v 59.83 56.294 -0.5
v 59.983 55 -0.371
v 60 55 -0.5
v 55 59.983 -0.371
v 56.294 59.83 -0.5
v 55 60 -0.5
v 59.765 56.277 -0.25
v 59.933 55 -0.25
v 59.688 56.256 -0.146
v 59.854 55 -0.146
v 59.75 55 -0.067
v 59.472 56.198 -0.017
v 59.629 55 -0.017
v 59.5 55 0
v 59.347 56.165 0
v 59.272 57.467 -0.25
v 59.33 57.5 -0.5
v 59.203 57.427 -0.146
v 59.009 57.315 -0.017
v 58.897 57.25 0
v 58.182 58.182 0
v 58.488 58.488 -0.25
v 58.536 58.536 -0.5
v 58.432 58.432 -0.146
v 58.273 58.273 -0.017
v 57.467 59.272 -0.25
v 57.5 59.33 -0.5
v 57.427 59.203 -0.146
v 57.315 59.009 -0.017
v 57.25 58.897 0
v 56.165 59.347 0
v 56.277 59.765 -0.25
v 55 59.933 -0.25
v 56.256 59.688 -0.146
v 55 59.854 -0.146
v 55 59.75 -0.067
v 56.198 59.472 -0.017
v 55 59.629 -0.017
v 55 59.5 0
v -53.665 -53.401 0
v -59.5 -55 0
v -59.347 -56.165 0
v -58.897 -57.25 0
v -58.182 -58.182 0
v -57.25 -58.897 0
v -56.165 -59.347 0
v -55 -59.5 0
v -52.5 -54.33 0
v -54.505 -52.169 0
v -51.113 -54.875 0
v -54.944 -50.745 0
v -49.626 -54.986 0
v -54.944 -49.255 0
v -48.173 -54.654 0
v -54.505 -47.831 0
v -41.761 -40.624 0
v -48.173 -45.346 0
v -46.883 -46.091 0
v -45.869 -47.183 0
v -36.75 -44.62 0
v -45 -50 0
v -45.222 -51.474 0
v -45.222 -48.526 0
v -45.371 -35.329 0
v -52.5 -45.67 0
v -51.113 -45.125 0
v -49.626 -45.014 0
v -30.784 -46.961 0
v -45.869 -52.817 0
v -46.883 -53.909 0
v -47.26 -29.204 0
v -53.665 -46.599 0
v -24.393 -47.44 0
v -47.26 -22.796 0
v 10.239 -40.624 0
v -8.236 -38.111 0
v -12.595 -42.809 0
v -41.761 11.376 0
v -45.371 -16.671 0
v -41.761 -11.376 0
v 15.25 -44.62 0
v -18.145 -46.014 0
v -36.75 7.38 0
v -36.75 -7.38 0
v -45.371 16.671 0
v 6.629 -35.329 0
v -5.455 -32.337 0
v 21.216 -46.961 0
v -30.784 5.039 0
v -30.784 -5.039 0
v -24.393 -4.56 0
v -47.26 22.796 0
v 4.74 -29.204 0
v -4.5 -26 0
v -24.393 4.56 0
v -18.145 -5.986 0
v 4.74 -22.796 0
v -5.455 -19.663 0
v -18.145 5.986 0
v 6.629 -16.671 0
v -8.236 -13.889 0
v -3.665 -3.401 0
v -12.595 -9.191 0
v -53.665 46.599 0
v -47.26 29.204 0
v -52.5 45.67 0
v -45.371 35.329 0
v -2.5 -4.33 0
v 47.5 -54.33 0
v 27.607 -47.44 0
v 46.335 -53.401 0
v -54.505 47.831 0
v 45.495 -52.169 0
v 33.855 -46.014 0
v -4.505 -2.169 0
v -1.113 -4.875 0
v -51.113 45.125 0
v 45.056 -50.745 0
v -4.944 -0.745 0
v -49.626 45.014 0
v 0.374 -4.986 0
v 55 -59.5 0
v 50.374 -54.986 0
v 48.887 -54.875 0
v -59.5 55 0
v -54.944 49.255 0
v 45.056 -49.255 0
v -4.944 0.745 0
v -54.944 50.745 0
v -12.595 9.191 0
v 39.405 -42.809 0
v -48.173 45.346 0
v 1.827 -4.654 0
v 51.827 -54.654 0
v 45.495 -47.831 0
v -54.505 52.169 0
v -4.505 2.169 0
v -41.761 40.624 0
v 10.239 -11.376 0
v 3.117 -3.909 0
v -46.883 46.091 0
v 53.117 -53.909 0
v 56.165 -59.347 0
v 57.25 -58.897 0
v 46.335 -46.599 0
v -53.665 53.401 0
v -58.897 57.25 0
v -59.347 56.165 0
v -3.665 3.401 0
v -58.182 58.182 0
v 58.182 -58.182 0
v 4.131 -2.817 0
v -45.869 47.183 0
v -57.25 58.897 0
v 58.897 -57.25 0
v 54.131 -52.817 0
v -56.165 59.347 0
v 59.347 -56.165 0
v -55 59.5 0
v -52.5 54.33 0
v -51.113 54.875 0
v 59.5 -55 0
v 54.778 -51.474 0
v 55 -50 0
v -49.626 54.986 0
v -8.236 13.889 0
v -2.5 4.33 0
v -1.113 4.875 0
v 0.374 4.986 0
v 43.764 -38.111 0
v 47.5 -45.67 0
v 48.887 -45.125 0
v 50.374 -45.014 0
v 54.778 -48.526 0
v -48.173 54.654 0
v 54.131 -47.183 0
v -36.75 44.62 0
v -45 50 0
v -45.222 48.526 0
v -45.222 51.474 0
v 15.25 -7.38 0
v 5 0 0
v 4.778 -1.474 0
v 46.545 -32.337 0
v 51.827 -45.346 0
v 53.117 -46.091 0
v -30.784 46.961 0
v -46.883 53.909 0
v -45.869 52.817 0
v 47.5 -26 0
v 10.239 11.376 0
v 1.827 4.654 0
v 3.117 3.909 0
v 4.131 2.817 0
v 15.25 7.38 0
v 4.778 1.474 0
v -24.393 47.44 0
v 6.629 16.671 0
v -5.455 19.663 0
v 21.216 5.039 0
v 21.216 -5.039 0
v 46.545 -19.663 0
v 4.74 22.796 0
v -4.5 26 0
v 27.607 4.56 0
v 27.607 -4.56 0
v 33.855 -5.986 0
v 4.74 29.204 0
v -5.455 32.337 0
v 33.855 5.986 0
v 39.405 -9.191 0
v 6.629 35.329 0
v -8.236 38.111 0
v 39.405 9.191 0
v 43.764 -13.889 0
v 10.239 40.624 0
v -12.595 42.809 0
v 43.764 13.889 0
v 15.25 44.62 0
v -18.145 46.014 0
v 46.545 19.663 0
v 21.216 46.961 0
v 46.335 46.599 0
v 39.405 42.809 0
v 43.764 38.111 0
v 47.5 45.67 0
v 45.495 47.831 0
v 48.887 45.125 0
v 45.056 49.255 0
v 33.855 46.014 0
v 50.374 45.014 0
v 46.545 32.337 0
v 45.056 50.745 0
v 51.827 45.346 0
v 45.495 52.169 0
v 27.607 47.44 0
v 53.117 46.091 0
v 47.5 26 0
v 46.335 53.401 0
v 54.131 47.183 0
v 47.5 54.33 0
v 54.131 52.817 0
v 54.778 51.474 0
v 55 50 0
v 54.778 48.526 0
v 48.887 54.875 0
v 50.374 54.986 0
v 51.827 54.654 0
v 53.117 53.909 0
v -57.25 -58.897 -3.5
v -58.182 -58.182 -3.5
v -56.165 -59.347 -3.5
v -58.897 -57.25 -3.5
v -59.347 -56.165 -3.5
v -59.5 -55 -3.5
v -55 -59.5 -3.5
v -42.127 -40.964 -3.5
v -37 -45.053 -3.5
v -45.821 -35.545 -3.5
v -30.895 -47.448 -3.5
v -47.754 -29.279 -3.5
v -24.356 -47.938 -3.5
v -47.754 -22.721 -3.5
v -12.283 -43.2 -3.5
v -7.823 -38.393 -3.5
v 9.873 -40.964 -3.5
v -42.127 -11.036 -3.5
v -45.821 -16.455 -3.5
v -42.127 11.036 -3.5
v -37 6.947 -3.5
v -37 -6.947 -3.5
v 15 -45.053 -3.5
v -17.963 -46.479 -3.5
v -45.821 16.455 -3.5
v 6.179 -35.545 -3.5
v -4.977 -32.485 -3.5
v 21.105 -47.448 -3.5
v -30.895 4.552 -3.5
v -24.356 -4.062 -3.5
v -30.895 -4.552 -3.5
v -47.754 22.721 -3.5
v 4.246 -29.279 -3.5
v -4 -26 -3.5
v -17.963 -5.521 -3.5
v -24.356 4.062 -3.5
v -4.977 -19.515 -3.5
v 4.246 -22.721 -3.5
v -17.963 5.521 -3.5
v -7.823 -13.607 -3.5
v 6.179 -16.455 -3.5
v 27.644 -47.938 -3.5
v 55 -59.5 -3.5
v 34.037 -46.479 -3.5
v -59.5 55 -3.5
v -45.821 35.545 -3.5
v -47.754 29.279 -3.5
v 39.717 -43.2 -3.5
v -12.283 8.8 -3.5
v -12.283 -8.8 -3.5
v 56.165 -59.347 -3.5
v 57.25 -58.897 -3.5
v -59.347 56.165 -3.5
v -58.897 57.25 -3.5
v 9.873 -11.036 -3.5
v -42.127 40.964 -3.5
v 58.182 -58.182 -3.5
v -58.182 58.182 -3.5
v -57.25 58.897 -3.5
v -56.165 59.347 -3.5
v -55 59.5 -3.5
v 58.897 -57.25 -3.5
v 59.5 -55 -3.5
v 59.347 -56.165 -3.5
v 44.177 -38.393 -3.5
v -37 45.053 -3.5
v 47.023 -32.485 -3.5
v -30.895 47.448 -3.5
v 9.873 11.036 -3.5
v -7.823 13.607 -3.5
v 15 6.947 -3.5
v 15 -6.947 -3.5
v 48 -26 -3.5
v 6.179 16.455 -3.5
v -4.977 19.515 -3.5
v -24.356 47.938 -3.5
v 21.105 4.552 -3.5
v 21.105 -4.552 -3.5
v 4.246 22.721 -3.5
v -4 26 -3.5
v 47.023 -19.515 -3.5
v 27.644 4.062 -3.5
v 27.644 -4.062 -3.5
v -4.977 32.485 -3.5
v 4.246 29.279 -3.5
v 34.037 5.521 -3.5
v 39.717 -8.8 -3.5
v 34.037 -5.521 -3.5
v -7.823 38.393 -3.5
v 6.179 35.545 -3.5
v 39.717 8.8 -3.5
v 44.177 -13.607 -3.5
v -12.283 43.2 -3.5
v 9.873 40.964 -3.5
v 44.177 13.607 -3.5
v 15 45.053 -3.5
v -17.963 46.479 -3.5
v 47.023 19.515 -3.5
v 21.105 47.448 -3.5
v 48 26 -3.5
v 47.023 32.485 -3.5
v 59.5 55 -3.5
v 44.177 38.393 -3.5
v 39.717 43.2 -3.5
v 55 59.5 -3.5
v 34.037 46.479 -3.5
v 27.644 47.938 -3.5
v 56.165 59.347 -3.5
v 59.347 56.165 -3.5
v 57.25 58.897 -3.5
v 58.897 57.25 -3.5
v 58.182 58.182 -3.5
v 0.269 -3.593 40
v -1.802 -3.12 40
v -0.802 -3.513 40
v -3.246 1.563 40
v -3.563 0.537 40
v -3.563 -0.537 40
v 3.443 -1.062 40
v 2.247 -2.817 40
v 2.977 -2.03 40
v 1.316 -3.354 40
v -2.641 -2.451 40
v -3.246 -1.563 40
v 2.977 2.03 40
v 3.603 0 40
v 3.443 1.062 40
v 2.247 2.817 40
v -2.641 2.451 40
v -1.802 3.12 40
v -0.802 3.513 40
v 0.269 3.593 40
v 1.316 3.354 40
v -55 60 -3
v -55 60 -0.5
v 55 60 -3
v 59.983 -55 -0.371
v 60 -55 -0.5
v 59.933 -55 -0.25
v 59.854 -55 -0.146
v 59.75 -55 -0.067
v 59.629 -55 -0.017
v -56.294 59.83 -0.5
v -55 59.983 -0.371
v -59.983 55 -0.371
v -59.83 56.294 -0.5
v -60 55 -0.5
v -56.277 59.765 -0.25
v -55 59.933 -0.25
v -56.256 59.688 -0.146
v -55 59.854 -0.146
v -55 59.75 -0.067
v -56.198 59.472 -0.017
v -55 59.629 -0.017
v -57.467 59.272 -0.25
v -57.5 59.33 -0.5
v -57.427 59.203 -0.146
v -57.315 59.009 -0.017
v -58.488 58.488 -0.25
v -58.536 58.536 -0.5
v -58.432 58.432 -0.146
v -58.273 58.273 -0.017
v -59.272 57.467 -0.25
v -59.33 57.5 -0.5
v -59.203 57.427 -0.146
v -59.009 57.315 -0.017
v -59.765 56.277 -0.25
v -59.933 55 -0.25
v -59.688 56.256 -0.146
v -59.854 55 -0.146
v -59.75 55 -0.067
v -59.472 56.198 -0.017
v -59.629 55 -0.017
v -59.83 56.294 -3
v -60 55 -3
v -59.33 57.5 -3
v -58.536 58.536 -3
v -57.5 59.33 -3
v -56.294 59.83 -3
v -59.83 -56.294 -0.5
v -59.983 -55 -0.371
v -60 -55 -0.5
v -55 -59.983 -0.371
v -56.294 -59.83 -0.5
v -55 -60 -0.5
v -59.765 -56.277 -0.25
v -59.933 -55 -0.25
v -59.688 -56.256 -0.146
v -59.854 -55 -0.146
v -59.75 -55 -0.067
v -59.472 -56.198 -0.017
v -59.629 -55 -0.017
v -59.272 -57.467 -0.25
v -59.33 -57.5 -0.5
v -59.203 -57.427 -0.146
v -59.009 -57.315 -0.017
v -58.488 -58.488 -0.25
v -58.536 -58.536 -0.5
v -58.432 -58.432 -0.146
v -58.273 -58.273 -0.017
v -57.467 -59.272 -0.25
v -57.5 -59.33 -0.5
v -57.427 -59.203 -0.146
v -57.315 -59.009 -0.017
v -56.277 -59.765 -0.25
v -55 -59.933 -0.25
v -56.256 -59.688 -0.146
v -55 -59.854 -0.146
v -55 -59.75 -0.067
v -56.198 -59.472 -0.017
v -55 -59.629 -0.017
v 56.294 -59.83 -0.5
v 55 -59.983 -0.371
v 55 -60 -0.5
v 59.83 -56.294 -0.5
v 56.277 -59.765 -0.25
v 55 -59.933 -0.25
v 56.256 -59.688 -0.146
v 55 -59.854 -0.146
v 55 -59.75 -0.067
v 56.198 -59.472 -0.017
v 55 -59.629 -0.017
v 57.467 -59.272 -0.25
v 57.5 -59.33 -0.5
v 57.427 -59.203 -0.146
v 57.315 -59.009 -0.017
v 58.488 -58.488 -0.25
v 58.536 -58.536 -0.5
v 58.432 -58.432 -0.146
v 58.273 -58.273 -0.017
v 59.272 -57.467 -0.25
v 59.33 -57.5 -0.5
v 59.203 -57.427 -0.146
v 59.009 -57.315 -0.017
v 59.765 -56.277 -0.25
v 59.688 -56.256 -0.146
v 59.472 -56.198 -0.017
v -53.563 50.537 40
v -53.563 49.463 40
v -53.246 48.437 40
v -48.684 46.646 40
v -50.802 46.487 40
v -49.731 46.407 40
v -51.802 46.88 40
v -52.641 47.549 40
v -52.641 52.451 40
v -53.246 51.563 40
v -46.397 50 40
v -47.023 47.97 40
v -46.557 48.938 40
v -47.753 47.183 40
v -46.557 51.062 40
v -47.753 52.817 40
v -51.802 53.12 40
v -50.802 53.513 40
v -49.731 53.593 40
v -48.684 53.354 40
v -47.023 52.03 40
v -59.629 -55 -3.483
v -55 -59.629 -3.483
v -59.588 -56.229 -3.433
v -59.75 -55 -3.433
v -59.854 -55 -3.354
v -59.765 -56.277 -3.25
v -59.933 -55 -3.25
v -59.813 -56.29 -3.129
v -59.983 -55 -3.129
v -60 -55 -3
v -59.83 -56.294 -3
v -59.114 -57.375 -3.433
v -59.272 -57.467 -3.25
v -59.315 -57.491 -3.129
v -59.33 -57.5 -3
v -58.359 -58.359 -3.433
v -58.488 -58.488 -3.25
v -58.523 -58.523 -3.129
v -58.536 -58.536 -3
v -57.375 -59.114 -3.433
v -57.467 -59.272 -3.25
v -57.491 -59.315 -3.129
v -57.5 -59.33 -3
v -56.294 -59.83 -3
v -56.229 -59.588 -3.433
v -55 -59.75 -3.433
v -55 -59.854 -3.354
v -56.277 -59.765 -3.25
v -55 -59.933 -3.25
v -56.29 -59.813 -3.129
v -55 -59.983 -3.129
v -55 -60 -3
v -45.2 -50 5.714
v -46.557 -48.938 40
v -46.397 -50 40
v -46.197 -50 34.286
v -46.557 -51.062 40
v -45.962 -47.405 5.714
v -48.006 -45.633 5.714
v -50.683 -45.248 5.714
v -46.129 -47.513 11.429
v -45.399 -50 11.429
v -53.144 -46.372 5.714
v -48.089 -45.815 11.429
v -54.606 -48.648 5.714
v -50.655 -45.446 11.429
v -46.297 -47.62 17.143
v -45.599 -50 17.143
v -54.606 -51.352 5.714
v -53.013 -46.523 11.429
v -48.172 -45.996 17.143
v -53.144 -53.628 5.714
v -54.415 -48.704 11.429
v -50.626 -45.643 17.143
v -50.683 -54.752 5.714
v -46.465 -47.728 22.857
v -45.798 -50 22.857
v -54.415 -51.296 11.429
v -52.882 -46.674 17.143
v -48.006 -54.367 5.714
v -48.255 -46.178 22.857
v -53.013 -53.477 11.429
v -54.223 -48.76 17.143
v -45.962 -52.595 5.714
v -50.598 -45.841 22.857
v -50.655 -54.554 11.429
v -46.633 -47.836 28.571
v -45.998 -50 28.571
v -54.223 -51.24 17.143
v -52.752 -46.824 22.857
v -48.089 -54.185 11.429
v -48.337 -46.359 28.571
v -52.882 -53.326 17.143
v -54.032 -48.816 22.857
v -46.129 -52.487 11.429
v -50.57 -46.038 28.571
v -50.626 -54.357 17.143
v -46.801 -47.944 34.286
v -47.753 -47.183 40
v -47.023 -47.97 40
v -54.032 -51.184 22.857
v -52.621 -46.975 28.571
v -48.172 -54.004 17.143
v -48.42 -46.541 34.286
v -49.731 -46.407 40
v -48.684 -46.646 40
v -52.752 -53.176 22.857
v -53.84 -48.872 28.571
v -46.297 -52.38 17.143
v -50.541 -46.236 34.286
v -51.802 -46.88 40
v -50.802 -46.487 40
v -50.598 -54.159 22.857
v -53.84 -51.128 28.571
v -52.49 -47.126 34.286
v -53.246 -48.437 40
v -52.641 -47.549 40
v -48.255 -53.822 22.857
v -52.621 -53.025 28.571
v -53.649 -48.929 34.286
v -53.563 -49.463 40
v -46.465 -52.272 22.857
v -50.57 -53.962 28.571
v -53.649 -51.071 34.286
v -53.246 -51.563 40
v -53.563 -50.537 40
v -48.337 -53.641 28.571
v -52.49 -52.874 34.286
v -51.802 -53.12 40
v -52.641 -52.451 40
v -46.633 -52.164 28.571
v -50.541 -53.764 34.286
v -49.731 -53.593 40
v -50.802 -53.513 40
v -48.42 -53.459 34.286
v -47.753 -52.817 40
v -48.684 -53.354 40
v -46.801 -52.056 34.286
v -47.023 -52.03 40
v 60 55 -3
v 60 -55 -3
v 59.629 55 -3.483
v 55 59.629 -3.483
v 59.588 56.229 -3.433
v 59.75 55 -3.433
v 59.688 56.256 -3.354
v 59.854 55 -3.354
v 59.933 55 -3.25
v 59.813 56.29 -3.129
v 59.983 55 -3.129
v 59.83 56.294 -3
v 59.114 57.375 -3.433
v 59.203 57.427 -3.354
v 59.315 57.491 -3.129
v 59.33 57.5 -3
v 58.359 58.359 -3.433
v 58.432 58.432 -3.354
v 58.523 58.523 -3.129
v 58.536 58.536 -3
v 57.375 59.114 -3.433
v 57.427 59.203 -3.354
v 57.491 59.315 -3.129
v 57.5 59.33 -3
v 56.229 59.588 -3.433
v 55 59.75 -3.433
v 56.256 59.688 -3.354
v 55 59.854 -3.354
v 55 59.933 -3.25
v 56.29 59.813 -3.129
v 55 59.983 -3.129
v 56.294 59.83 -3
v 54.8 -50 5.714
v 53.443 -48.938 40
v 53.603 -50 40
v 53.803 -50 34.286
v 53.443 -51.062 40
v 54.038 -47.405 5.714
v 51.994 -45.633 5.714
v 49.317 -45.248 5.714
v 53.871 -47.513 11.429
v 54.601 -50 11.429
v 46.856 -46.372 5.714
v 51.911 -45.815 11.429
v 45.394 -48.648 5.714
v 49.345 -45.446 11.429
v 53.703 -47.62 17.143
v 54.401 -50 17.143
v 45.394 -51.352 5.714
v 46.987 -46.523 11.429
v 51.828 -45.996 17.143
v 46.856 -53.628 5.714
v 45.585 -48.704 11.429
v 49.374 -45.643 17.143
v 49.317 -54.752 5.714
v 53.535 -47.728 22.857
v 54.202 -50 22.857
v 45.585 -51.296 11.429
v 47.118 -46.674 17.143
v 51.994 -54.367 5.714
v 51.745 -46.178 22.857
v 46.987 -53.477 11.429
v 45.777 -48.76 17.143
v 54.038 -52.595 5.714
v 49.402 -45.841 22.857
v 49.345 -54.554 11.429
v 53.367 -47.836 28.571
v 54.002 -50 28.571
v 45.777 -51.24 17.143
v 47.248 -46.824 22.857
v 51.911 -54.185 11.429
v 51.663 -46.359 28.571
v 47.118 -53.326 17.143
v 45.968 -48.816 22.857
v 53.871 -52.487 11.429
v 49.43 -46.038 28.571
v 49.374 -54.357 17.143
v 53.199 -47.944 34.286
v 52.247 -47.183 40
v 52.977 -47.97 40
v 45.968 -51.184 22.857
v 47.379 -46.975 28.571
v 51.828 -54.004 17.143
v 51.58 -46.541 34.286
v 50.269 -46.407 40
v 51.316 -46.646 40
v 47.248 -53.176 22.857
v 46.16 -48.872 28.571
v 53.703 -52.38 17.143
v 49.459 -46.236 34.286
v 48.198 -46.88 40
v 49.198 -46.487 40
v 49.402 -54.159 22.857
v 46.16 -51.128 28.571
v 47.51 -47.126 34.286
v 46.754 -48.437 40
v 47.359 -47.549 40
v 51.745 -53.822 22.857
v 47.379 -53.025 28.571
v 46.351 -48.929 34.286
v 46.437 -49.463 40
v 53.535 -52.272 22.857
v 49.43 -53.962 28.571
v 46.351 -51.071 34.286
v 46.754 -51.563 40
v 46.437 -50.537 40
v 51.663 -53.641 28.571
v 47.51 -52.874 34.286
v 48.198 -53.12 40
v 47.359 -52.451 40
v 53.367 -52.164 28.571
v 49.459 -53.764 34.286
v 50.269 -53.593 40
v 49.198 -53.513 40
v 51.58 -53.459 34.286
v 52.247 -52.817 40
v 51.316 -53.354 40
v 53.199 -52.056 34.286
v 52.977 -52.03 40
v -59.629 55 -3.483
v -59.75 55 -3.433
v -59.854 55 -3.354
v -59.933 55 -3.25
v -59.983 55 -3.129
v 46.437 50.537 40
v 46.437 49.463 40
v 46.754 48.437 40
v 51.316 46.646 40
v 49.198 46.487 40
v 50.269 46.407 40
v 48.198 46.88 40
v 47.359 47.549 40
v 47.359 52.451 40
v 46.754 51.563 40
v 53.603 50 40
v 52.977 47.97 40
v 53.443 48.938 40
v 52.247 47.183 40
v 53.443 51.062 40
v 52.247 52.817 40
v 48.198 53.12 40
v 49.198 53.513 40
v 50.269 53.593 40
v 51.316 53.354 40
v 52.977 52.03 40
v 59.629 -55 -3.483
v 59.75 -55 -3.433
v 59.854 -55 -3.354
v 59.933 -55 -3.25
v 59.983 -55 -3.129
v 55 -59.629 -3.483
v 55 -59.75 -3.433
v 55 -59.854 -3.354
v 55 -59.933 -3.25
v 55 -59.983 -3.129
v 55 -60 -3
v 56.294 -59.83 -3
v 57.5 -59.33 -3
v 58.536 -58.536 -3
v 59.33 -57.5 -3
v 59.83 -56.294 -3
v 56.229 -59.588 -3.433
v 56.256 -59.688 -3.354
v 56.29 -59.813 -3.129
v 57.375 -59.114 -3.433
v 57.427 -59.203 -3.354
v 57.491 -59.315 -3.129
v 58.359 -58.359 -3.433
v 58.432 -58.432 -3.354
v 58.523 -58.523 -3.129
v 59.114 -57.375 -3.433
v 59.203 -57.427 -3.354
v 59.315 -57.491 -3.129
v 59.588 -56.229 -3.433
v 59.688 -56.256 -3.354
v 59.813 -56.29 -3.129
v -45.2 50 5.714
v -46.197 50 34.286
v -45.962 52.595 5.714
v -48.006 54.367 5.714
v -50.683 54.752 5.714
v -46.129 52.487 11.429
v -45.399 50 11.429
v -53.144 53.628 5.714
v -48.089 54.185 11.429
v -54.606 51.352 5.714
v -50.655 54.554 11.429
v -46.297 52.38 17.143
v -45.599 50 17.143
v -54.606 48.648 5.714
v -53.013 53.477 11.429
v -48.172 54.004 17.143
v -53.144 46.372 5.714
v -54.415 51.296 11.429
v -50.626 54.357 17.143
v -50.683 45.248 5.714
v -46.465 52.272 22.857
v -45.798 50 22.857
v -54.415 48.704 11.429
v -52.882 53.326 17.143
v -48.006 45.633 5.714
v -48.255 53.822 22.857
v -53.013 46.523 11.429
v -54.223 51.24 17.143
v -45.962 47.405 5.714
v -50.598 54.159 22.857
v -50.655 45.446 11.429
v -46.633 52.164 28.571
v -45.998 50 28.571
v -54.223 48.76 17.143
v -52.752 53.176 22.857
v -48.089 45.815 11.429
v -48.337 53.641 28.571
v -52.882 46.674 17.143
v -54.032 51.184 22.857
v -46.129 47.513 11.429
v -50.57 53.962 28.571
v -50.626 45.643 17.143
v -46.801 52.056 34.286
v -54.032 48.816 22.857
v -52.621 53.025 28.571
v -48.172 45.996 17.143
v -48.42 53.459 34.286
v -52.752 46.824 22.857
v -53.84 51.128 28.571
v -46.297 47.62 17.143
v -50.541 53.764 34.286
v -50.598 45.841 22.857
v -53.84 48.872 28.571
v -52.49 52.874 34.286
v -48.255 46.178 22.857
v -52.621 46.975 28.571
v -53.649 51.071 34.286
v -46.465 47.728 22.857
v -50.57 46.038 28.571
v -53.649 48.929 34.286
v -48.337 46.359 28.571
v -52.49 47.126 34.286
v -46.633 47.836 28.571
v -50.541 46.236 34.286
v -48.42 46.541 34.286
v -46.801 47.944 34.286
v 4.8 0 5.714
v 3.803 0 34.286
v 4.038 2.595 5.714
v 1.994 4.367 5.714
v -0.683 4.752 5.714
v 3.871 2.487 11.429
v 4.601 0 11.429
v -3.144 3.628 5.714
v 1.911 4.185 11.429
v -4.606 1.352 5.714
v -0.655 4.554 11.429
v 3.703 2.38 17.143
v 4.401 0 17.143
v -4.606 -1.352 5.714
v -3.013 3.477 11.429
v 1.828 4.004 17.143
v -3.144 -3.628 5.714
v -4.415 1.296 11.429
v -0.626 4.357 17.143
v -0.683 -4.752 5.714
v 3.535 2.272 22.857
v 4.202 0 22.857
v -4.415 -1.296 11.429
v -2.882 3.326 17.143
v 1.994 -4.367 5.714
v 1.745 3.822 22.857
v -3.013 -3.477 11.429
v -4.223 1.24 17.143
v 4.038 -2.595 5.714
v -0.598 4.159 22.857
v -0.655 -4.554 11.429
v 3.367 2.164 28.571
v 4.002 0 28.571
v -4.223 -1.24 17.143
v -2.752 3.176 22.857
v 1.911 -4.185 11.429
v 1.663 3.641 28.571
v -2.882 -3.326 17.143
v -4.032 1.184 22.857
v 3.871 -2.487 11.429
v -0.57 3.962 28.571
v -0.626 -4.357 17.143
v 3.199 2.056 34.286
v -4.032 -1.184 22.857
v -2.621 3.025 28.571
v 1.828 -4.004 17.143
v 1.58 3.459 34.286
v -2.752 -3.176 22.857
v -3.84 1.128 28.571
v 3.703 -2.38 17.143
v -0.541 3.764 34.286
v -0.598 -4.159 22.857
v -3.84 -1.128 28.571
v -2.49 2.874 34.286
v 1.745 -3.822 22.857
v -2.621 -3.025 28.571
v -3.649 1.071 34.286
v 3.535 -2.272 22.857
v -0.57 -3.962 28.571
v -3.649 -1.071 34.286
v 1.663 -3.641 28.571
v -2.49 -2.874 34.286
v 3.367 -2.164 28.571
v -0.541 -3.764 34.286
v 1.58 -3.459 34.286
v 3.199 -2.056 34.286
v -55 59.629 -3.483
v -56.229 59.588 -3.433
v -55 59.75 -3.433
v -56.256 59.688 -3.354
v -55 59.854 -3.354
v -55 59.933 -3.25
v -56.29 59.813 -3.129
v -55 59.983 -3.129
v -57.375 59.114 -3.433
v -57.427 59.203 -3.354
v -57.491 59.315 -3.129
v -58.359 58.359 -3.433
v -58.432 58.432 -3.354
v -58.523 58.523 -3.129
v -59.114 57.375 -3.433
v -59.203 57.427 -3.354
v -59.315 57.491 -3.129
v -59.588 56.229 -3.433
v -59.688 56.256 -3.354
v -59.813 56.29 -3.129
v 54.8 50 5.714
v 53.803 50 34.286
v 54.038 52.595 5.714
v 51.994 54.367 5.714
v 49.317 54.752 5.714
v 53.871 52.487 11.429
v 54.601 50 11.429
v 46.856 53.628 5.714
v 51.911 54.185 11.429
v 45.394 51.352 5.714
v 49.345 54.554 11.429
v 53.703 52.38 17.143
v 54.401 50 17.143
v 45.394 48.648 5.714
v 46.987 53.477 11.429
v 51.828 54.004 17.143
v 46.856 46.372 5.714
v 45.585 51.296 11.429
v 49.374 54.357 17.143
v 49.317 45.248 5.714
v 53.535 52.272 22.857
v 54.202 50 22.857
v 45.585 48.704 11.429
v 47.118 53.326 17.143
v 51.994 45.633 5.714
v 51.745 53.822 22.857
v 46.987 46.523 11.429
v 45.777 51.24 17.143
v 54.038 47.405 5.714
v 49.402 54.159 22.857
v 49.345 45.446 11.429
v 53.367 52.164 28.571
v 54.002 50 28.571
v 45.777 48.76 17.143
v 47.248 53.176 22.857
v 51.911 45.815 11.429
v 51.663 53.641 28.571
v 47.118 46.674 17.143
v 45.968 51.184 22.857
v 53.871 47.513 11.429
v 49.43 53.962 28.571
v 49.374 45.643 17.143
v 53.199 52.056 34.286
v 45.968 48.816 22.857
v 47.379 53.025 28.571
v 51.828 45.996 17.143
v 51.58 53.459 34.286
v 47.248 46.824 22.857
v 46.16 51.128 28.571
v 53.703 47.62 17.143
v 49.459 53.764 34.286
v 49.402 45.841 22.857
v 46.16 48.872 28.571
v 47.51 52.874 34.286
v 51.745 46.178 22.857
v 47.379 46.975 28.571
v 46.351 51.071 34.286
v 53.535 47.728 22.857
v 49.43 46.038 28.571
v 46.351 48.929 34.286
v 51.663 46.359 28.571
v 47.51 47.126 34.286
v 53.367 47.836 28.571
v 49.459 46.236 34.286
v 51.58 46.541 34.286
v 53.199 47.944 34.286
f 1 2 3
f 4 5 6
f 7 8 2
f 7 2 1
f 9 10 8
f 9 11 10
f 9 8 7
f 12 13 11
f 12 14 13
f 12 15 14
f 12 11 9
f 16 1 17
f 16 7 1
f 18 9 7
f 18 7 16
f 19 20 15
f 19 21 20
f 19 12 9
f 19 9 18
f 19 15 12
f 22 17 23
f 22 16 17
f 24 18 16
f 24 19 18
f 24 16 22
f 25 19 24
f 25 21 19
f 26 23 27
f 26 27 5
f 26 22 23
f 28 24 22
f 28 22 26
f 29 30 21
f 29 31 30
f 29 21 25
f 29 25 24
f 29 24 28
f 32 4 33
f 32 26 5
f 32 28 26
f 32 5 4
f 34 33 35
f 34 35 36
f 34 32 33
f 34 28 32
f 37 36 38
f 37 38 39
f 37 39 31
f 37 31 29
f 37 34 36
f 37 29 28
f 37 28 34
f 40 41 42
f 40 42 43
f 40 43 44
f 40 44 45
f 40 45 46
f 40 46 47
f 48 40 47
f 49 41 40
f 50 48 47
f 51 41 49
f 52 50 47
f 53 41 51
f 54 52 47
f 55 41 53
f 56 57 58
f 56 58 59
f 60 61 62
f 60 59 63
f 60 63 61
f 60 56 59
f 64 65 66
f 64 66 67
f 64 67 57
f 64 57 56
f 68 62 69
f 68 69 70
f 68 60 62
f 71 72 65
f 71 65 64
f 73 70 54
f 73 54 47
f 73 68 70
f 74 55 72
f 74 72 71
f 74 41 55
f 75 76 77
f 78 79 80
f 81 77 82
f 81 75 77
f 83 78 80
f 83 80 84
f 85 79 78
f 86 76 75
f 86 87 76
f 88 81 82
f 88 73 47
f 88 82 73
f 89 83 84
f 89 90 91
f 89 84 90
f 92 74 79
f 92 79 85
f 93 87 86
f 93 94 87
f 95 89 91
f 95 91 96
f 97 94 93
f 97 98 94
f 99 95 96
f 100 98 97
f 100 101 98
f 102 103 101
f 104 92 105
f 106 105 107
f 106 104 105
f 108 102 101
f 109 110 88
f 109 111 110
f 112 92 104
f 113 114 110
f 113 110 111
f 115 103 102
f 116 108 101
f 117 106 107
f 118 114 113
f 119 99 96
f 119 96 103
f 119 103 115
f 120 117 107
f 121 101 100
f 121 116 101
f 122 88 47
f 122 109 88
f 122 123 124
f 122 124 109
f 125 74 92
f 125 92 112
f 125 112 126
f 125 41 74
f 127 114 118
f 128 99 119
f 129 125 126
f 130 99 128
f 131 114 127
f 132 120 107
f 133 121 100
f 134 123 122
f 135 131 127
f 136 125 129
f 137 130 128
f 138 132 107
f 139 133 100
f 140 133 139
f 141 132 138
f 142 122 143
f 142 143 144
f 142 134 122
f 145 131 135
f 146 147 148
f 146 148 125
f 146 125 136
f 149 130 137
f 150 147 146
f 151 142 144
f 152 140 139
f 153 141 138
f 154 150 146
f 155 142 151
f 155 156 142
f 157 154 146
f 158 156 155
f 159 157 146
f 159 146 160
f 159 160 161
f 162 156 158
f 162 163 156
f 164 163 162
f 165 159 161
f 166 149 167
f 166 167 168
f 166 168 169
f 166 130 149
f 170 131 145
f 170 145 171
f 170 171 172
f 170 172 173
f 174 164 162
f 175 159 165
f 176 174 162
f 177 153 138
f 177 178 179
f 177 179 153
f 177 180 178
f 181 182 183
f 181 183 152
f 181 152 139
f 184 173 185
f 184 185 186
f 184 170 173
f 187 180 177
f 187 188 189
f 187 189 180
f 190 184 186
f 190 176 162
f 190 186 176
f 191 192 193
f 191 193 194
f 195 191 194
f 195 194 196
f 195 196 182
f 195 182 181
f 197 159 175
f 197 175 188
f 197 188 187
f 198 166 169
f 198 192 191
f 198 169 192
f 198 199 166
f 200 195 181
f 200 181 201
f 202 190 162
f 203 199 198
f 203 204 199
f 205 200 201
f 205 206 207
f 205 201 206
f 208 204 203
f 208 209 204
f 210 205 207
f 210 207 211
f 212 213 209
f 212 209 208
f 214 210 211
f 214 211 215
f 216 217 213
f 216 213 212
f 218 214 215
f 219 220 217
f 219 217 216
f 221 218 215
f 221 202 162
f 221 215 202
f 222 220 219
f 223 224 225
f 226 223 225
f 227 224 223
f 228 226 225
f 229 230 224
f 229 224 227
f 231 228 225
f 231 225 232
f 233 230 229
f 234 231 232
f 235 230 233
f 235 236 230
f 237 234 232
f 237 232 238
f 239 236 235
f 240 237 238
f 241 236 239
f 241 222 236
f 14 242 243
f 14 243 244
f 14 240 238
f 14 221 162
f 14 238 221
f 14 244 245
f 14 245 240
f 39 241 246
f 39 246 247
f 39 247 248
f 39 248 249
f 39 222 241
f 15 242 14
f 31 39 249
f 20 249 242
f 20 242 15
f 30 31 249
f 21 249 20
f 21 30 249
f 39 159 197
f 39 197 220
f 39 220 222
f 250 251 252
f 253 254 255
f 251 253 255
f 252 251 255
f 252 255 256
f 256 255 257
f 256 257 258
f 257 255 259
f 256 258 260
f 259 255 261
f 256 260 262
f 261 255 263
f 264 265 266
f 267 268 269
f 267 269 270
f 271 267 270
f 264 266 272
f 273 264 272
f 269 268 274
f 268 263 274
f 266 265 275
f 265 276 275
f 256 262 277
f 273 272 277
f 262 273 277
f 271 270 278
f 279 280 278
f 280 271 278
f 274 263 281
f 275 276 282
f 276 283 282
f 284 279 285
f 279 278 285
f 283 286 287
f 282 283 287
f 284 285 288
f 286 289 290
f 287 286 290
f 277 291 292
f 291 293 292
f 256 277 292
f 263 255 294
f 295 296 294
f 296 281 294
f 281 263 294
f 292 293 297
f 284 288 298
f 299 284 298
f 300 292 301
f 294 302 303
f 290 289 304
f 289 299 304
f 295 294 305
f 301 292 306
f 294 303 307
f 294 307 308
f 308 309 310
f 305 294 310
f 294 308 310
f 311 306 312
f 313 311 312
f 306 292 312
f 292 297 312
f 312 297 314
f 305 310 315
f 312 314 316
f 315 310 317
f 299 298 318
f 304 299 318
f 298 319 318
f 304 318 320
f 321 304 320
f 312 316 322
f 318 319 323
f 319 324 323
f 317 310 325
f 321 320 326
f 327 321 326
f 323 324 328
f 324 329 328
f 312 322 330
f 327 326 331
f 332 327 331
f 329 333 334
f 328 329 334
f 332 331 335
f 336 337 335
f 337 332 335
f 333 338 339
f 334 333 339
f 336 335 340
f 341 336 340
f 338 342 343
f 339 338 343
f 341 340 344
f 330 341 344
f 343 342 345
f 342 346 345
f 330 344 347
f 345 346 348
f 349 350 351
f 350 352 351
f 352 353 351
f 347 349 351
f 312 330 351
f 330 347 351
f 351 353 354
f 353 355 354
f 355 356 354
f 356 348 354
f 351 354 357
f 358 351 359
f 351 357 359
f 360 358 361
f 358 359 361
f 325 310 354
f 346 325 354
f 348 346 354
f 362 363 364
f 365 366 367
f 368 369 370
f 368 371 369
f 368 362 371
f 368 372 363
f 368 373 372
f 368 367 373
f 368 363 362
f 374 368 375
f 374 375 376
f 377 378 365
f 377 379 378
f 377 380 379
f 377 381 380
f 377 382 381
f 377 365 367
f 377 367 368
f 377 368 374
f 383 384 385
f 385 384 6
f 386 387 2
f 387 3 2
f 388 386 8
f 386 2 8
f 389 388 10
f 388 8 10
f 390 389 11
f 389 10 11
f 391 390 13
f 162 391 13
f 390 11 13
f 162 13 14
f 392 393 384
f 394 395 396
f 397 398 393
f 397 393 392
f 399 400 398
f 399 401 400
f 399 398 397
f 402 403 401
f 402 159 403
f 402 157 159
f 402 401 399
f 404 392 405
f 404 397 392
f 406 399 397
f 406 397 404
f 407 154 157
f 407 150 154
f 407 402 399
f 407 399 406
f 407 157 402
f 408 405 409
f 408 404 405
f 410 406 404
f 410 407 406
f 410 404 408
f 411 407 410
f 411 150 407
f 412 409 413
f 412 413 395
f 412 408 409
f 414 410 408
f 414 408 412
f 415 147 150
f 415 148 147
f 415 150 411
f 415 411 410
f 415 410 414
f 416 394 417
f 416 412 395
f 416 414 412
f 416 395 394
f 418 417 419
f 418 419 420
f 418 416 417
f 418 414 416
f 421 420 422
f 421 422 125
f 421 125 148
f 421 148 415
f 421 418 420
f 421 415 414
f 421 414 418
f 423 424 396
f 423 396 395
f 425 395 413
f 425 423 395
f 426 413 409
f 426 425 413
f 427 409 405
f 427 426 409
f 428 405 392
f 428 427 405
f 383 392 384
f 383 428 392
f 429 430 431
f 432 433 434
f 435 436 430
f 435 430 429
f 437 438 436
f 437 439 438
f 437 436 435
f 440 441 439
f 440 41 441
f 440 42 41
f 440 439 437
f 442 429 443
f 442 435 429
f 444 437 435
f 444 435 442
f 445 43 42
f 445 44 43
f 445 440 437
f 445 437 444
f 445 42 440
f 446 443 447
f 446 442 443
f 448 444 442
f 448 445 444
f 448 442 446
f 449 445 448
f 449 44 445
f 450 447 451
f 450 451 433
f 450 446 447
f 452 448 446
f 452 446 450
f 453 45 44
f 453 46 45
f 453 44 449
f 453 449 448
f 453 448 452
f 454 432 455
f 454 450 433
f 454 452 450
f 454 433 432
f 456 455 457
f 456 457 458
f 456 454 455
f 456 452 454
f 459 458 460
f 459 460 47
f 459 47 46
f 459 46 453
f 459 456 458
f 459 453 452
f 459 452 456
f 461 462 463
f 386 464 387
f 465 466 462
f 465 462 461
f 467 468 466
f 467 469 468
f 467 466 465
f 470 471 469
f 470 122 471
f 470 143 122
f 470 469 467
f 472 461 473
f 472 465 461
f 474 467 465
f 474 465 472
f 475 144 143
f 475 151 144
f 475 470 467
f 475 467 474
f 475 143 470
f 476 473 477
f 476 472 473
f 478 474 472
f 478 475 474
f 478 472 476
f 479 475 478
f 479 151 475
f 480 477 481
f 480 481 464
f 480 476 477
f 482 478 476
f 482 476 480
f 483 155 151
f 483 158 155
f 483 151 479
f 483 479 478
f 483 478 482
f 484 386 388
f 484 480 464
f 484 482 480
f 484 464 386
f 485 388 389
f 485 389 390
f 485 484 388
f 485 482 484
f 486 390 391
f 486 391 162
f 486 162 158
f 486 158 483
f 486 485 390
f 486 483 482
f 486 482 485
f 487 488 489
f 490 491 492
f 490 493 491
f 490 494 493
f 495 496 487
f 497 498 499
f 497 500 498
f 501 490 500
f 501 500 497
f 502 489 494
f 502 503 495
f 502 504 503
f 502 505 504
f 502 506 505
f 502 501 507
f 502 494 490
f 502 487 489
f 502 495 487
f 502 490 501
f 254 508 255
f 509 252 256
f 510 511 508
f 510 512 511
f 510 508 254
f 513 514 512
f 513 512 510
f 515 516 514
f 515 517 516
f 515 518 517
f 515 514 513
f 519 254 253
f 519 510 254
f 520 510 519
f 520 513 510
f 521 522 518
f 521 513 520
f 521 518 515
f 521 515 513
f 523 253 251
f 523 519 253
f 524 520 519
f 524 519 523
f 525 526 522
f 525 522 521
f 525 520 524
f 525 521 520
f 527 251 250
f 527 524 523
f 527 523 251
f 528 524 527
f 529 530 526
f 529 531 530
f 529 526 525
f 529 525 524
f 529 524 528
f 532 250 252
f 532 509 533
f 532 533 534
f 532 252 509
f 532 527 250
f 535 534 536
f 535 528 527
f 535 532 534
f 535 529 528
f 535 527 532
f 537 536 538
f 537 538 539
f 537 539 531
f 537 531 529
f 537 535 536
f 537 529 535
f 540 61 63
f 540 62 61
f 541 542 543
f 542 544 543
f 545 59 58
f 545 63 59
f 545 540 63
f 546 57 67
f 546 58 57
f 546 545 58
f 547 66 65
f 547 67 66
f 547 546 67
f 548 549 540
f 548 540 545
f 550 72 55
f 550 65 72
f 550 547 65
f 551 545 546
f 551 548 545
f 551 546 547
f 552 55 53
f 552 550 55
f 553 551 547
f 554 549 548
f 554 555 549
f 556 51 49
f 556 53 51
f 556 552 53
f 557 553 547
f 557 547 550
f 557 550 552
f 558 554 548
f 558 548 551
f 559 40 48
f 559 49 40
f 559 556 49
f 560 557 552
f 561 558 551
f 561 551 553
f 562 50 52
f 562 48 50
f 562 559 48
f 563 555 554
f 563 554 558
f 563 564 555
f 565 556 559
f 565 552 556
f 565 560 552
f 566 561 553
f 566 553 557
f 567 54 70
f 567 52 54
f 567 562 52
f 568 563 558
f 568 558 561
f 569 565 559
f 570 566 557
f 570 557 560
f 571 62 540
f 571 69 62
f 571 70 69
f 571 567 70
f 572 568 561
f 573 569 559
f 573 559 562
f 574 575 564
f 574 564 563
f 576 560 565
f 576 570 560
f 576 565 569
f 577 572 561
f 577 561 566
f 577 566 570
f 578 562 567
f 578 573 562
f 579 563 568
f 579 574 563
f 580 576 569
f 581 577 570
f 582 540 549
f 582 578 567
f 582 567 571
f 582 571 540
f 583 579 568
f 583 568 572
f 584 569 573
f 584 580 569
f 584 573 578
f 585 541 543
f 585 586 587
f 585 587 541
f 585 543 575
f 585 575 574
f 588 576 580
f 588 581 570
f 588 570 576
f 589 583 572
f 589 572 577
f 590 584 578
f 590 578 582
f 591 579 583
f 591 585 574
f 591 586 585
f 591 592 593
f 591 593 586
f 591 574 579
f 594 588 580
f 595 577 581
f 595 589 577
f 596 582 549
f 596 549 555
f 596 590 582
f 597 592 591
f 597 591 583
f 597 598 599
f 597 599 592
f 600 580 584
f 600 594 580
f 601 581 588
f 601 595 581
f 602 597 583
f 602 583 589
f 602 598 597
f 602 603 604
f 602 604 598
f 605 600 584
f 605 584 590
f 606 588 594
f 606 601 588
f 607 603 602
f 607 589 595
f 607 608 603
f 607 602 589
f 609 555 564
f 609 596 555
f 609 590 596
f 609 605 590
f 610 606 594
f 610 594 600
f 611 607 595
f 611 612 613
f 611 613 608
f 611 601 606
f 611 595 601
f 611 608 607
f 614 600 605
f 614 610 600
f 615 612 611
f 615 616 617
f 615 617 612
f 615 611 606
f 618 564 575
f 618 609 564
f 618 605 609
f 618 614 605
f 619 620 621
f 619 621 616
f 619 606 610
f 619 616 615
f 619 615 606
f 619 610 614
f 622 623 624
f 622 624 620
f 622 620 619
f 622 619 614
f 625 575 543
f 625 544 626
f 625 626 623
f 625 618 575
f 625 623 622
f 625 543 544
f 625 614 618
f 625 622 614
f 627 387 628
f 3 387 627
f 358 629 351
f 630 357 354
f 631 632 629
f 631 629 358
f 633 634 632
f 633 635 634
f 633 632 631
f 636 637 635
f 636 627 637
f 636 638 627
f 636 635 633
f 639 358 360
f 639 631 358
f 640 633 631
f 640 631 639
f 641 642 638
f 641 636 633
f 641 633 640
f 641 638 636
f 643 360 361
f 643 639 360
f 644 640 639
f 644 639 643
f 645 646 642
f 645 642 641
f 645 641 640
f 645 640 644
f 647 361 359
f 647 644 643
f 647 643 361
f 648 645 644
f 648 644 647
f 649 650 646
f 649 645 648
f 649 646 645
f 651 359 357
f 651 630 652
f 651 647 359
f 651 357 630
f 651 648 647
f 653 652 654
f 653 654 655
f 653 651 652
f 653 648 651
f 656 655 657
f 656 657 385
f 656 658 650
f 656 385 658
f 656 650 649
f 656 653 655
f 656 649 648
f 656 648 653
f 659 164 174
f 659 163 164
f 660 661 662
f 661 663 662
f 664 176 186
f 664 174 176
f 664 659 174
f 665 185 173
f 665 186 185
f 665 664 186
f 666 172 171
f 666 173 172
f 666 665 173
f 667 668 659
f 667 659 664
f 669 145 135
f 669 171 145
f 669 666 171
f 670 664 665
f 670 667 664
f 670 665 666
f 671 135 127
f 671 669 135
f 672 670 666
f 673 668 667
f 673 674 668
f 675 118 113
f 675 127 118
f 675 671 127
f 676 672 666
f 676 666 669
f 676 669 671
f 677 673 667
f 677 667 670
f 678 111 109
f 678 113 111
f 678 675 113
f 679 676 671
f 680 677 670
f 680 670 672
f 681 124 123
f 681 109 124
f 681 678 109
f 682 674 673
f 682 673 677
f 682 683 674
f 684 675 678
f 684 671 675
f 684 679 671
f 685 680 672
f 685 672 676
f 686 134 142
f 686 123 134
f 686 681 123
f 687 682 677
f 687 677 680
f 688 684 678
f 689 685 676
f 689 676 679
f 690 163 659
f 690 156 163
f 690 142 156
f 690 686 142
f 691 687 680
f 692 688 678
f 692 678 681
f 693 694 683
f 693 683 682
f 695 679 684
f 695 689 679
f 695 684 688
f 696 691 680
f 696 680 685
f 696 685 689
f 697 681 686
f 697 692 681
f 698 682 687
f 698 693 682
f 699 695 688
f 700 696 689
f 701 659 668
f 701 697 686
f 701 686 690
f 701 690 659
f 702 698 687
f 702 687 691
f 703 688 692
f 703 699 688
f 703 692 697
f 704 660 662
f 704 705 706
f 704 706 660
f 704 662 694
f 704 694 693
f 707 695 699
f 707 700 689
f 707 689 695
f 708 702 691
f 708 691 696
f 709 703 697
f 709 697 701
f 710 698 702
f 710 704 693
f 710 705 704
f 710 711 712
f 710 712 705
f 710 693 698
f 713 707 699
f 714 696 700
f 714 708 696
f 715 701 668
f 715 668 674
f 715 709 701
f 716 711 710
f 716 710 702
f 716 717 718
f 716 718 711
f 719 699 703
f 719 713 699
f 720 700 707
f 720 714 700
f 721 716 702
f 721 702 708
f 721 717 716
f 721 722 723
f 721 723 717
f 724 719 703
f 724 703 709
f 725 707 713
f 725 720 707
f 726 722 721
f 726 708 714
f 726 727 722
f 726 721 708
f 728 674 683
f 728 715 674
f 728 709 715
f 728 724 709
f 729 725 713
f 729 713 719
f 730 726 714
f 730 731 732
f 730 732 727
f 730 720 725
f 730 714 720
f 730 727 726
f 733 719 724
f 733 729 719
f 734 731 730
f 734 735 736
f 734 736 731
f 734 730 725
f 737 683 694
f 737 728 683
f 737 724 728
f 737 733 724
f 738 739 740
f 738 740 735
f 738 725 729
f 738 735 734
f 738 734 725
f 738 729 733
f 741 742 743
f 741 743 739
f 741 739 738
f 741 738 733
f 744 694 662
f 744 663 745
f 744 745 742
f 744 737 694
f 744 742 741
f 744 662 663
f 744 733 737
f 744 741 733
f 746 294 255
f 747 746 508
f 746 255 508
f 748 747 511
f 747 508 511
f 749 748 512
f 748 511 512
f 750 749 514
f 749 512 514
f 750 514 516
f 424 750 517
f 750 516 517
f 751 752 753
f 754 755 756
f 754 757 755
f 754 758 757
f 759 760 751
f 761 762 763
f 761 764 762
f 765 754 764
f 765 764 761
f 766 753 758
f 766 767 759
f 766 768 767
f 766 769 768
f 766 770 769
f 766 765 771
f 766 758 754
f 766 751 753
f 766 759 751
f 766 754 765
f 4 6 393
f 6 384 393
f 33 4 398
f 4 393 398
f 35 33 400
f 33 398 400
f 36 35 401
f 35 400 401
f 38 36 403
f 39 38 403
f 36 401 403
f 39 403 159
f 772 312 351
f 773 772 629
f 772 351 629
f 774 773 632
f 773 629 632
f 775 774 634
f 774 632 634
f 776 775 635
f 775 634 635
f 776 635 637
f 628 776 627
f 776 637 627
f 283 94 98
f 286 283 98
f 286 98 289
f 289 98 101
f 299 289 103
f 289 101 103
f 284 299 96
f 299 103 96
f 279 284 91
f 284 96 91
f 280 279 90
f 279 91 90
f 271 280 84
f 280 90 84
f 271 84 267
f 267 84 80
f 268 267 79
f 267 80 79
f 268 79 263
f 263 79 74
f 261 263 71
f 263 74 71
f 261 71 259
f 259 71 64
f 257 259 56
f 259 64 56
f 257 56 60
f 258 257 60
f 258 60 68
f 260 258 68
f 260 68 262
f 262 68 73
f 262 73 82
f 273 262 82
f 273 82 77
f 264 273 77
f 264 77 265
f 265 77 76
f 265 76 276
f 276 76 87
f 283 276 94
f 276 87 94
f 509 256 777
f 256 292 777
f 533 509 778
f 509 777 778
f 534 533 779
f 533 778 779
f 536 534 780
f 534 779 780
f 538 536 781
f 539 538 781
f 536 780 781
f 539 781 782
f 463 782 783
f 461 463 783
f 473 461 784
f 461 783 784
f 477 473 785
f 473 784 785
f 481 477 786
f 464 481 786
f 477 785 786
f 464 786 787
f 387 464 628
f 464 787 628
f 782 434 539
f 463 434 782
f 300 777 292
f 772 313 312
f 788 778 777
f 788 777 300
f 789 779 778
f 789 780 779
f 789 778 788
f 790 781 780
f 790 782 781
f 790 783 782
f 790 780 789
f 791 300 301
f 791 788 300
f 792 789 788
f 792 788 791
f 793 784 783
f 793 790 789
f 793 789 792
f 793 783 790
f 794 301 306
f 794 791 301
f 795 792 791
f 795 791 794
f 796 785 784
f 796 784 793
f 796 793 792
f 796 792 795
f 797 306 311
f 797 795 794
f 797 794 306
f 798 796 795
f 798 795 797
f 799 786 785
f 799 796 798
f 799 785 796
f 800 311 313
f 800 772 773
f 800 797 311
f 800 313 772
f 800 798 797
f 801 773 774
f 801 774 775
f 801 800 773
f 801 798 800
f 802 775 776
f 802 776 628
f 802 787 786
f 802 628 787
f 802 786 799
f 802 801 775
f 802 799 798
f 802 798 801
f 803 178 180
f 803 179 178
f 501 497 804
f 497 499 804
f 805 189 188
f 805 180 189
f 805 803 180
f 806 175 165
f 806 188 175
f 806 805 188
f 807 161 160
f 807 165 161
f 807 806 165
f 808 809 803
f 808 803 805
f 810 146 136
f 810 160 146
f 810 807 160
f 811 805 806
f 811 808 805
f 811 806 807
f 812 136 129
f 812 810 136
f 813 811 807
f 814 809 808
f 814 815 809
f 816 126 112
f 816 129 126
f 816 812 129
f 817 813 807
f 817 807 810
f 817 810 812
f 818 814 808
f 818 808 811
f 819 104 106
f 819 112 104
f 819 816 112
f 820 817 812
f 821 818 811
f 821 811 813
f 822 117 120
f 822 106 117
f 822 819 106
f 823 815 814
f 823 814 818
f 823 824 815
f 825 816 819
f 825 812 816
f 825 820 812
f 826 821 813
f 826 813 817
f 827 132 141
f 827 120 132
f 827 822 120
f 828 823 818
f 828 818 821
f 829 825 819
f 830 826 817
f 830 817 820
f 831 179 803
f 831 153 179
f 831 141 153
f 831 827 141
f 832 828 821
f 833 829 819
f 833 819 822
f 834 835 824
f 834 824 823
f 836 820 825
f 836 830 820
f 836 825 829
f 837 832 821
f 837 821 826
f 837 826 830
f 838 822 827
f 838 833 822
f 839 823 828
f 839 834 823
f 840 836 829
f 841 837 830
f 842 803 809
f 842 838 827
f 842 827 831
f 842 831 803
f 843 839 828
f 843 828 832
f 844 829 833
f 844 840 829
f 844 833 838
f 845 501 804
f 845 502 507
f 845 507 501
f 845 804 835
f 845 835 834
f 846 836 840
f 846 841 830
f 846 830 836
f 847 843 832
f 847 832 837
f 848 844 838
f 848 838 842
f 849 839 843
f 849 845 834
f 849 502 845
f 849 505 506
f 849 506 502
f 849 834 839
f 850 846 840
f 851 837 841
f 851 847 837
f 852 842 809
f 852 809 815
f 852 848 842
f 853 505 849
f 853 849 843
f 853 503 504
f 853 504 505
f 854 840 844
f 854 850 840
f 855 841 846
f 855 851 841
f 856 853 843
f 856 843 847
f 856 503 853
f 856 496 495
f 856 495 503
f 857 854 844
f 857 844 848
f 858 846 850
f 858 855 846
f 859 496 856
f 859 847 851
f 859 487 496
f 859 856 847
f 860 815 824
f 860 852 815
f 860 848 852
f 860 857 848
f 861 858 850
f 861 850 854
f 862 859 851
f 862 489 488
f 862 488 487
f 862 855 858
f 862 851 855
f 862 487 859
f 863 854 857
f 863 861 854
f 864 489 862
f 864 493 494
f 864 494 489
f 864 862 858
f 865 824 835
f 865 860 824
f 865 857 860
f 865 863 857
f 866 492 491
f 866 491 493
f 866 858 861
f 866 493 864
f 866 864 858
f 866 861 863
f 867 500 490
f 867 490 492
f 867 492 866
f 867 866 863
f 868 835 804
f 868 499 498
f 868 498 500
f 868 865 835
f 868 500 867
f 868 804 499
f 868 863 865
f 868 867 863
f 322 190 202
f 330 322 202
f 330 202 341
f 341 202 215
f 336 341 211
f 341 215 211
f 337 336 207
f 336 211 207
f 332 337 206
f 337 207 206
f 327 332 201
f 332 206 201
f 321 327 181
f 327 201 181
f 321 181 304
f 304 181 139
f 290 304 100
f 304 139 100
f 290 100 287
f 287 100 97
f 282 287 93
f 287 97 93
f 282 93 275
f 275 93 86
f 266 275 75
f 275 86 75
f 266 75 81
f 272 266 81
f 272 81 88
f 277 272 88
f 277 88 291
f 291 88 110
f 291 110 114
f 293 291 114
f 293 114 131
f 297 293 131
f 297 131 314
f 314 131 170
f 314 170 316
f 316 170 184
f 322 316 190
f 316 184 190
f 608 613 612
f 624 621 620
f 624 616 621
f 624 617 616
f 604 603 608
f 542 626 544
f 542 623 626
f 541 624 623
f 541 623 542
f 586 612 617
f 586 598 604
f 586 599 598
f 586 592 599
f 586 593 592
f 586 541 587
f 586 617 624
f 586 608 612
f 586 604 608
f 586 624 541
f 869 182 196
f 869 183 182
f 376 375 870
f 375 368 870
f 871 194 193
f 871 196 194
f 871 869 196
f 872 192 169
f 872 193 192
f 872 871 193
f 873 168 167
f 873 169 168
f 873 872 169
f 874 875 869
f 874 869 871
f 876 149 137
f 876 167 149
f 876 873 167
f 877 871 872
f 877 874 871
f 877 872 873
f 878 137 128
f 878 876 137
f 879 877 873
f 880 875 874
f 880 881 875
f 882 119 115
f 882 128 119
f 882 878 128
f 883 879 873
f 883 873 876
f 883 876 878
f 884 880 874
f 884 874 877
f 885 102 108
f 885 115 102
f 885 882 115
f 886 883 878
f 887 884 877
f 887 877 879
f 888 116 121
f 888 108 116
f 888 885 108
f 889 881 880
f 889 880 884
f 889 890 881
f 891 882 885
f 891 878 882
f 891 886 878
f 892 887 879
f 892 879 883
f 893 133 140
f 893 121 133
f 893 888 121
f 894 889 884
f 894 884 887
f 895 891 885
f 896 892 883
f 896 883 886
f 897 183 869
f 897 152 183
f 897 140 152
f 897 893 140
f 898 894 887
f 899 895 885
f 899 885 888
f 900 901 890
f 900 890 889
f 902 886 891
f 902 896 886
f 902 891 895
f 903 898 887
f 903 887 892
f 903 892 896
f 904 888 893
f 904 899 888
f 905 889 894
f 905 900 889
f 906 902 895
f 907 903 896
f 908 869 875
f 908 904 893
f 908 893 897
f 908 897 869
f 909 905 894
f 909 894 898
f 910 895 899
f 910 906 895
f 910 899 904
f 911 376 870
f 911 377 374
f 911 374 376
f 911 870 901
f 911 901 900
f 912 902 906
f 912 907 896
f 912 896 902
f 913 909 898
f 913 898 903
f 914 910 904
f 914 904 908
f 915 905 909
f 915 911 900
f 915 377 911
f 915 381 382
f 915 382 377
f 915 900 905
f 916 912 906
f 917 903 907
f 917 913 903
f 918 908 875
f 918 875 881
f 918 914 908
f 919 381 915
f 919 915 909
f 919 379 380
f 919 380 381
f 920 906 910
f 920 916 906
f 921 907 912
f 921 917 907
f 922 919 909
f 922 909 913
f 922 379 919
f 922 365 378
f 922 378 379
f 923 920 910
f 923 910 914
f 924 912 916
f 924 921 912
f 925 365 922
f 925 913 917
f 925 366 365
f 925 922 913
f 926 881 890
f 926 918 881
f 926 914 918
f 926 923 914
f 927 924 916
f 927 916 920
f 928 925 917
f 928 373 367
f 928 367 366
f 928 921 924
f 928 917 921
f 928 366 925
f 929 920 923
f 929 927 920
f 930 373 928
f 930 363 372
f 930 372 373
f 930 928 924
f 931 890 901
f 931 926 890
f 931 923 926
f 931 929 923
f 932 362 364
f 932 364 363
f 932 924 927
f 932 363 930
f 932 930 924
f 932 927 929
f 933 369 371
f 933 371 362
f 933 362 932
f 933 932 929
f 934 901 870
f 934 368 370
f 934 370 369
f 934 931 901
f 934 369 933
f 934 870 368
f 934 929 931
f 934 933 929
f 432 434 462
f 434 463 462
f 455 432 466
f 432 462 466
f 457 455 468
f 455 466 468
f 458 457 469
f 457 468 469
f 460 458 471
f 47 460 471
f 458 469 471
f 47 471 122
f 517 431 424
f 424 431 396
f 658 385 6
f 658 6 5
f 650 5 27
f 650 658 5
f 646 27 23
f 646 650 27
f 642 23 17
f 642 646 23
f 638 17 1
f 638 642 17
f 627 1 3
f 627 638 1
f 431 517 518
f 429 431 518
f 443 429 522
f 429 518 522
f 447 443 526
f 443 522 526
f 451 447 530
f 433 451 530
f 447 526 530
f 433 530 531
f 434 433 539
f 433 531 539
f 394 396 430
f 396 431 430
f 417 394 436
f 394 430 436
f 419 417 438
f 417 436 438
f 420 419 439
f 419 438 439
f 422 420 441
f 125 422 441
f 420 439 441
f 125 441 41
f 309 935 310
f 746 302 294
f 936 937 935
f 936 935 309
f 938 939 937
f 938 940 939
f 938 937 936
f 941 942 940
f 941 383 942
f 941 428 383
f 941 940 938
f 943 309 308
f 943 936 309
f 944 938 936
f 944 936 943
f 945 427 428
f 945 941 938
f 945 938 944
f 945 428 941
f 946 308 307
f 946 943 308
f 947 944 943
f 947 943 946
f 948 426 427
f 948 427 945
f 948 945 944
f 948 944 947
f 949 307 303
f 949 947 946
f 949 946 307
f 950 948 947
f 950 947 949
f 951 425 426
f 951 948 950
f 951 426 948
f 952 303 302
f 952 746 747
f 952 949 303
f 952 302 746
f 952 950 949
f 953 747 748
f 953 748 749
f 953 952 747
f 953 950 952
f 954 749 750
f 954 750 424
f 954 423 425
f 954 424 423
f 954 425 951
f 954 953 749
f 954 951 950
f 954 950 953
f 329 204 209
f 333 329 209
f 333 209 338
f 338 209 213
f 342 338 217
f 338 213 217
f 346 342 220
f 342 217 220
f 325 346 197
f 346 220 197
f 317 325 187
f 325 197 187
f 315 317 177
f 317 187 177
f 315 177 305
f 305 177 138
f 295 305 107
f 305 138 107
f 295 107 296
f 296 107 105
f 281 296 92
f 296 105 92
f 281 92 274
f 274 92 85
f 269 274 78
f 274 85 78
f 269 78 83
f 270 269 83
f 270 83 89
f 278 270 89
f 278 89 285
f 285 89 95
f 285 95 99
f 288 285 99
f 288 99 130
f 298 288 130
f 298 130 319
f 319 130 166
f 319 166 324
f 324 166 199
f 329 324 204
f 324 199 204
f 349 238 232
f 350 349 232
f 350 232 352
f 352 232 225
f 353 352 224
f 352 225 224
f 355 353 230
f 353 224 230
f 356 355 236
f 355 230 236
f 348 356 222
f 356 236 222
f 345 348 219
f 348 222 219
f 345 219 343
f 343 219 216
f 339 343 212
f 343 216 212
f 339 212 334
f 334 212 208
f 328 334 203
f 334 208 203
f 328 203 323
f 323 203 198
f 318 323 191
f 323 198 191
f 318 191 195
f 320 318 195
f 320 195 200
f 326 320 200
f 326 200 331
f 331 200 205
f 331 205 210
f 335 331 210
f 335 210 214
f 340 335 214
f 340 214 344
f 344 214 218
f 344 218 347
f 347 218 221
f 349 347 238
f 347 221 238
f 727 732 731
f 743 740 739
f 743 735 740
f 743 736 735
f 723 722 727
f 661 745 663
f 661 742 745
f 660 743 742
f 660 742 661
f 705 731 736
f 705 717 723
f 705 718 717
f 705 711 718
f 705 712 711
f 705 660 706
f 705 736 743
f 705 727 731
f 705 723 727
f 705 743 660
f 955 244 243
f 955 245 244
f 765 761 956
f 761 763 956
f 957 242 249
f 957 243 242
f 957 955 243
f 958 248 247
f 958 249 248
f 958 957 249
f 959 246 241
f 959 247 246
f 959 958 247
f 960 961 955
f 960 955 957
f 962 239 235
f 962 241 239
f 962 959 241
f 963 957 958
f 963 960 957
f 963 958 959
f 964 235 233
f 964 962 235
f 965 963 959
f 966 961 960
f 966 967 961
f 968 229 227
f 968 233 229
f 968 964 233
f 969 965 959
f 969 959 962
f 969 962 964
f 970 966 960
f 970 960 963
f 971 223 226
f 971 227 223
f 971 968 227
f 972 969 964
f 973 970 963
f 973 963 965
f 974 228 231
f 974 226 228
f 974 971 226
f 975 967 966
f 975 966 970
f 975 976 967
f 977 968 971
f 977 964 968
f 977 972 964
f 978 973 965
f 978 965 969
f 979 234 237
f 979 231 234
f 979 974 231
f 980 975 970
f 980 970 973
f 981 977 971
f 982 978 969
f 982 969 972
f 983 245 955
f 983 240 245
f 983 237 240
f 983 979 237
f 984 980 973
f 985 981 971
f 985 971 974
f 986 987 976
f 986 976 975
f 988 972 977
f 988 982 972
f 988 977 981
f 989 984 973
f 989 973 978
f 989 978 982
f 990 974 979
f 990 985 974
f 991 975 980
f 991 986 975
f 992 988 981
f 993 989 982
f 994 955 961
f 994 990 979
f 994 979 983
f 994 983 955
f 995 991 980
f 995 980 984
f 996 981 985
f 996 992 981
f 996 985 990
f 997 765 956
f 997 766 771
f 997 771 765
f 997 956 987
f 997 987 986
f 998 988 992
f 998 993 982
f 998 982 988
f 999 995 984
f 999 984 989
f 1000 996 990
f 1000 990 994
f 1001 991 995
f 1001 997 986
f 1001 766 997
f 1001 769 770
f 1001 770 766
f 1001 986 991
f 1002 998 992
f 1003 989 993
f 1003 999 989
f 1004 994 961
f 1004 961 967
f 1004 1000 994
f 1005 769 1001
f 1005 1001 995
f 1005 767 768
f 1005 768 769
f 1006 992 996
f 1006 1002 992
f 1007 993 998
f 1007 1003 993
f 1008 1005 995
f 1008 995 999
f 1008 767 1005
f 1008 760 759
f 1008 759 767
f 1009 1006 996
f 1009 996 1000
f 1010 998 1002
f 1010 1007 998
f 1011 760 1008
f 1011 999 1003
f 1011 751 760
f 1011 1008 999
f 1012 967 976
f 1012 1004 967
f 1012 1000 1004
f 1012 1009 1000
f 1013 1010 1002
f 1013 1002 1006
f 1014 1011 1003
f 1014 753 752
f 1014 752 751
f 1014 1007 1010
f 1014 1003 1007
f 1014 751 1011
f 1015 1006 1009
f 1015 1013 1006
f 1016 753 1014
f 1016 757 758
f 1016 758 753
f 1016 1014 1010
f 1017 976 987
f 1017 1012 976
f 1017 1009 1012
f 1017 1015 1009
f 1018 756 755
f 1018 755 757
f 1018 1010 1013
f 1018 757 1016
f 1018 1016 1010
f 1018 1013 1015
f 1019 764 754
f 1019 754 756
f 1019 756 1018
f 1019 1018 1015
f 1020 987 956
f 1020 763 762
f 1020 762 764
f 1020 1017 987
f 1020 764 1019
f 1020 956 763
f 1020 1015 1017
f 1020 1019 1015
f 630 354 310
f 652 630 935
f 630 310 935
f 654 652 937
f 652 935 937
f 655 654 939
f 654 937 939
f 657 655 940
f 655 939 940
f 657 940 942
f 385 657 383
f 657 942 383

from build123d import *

# Parameters (mm, degrees)
F0_W     = 120
F0_H     = 120
F0_R     = 5
F0_R_2   = 21.5
F1_DEPTH = 3.5
F2_DEPTH = 40
F2_TAPER = 2
F3_R     = 5
F4_SIZE2 = 3.49999
F4_SIZE  = 0.49999
F5_R     = 0.5


# Not quite as in the source:
# - a fillet or chamfer is up to 0.001 mm smaller than in the source, because OpenCascade refuses the exact size


with BuildPart() as f1:
    # F0 (on Top) → F1 (new body)
    with BuildSketch(Plane.XY):
        Rectangle(F0_W, F0_H)
        with Locations((-50, -50)):
            Circle(F0_R, mode=Mode.SUBTRACT)
        with Locations((-26, -26)):
            Circle(F0_R_2, mode=Mode.SUBTRACT)
        with Locations((50, -50)):
            Circle(F0_R, mode=Mode.SUBTRACT)
        with Locations((26, -26)):
            Circle(F0_R_2, mode=Mode.SUBTRACT)
        with Locations((-26, 26)):
            Circle(F0_R_2, mode=Mode.SUBTRACT)
        with Locations((-50, 50)):
            Circle(F0_R, mode=Mode.SUBTRACT)
        Circle(F0_R, mode=Mode.SUBTRACT)
        with Locations((26, 26)):
            Circle(F0_R_2, mode=Mode.SUBTRACT)
        with Locations((50, 50)):
            Circle(F0_R, mode=Mode.SUBTRACT)
        with Locations((-50, 50)):
            Circle(F0_R)
        Circle(F0_R)
        with Locations((50, 50)):
            Circle(F0_R)
        with Locations((-50, -50)):
            Circle(F0_R)
        with Locations((50, -50)):
            Circle(F0_R)
    extrude(amount=-F1_DEPTH)

    # F0 (on Top) → F2 (join)
    with BuildSketch(Plane.XY):
        with Locations((-50, 50)):
            Circle(F0_R)
        Circle(F0_R)
        with Locations((50, 50)):
            Circle(F0_R)
        with Locations((50, -50)):
            Circle(F0_R)
        with Locations((-50, -50)):
            Circle(F0_R)
    extrude(amount=F2_DEPTH, taper=F2_TAPER)

    # F3
    f3_edges = [f1.edges().sort_by_distance(p)[0] for p in [
        (-60, -60, -1.75),
        (-60, 60, -1.75),
        (60, 60, -1.75),
        (60, -60, -1.75),
    ]]
    fillet(f3_edges, radius=F3_R)

    # F4 (size 0.5 and 3.5 in the source; OpenCascade refuses exactly that, so slightly less here)
    f4_edges = [f1.edges().sort_by_distance(p)[0] for p in [
        (4.5, 26, -3.5),
        (-47.5, 26, -3.5),
        (-47.5, -26, -3.5),
        (4.5, -26, -3.5),
    ]]
    f4_side = f1.faces().sort_by_distance((0, 0, -3.5))[0]
    chamfer(f4_edges, length=F4_SIZE, length2=F4_SIZE2, reference=f4_side)

    # F5
    f5_edges = [f1.edges().sort_by_distance(p)[0] for p in [
        (0, -60, -3.5),
        (0, -60, 0),
    ]]
    fillet(f5_edges, radius=F5_R)


solid = f1.part
